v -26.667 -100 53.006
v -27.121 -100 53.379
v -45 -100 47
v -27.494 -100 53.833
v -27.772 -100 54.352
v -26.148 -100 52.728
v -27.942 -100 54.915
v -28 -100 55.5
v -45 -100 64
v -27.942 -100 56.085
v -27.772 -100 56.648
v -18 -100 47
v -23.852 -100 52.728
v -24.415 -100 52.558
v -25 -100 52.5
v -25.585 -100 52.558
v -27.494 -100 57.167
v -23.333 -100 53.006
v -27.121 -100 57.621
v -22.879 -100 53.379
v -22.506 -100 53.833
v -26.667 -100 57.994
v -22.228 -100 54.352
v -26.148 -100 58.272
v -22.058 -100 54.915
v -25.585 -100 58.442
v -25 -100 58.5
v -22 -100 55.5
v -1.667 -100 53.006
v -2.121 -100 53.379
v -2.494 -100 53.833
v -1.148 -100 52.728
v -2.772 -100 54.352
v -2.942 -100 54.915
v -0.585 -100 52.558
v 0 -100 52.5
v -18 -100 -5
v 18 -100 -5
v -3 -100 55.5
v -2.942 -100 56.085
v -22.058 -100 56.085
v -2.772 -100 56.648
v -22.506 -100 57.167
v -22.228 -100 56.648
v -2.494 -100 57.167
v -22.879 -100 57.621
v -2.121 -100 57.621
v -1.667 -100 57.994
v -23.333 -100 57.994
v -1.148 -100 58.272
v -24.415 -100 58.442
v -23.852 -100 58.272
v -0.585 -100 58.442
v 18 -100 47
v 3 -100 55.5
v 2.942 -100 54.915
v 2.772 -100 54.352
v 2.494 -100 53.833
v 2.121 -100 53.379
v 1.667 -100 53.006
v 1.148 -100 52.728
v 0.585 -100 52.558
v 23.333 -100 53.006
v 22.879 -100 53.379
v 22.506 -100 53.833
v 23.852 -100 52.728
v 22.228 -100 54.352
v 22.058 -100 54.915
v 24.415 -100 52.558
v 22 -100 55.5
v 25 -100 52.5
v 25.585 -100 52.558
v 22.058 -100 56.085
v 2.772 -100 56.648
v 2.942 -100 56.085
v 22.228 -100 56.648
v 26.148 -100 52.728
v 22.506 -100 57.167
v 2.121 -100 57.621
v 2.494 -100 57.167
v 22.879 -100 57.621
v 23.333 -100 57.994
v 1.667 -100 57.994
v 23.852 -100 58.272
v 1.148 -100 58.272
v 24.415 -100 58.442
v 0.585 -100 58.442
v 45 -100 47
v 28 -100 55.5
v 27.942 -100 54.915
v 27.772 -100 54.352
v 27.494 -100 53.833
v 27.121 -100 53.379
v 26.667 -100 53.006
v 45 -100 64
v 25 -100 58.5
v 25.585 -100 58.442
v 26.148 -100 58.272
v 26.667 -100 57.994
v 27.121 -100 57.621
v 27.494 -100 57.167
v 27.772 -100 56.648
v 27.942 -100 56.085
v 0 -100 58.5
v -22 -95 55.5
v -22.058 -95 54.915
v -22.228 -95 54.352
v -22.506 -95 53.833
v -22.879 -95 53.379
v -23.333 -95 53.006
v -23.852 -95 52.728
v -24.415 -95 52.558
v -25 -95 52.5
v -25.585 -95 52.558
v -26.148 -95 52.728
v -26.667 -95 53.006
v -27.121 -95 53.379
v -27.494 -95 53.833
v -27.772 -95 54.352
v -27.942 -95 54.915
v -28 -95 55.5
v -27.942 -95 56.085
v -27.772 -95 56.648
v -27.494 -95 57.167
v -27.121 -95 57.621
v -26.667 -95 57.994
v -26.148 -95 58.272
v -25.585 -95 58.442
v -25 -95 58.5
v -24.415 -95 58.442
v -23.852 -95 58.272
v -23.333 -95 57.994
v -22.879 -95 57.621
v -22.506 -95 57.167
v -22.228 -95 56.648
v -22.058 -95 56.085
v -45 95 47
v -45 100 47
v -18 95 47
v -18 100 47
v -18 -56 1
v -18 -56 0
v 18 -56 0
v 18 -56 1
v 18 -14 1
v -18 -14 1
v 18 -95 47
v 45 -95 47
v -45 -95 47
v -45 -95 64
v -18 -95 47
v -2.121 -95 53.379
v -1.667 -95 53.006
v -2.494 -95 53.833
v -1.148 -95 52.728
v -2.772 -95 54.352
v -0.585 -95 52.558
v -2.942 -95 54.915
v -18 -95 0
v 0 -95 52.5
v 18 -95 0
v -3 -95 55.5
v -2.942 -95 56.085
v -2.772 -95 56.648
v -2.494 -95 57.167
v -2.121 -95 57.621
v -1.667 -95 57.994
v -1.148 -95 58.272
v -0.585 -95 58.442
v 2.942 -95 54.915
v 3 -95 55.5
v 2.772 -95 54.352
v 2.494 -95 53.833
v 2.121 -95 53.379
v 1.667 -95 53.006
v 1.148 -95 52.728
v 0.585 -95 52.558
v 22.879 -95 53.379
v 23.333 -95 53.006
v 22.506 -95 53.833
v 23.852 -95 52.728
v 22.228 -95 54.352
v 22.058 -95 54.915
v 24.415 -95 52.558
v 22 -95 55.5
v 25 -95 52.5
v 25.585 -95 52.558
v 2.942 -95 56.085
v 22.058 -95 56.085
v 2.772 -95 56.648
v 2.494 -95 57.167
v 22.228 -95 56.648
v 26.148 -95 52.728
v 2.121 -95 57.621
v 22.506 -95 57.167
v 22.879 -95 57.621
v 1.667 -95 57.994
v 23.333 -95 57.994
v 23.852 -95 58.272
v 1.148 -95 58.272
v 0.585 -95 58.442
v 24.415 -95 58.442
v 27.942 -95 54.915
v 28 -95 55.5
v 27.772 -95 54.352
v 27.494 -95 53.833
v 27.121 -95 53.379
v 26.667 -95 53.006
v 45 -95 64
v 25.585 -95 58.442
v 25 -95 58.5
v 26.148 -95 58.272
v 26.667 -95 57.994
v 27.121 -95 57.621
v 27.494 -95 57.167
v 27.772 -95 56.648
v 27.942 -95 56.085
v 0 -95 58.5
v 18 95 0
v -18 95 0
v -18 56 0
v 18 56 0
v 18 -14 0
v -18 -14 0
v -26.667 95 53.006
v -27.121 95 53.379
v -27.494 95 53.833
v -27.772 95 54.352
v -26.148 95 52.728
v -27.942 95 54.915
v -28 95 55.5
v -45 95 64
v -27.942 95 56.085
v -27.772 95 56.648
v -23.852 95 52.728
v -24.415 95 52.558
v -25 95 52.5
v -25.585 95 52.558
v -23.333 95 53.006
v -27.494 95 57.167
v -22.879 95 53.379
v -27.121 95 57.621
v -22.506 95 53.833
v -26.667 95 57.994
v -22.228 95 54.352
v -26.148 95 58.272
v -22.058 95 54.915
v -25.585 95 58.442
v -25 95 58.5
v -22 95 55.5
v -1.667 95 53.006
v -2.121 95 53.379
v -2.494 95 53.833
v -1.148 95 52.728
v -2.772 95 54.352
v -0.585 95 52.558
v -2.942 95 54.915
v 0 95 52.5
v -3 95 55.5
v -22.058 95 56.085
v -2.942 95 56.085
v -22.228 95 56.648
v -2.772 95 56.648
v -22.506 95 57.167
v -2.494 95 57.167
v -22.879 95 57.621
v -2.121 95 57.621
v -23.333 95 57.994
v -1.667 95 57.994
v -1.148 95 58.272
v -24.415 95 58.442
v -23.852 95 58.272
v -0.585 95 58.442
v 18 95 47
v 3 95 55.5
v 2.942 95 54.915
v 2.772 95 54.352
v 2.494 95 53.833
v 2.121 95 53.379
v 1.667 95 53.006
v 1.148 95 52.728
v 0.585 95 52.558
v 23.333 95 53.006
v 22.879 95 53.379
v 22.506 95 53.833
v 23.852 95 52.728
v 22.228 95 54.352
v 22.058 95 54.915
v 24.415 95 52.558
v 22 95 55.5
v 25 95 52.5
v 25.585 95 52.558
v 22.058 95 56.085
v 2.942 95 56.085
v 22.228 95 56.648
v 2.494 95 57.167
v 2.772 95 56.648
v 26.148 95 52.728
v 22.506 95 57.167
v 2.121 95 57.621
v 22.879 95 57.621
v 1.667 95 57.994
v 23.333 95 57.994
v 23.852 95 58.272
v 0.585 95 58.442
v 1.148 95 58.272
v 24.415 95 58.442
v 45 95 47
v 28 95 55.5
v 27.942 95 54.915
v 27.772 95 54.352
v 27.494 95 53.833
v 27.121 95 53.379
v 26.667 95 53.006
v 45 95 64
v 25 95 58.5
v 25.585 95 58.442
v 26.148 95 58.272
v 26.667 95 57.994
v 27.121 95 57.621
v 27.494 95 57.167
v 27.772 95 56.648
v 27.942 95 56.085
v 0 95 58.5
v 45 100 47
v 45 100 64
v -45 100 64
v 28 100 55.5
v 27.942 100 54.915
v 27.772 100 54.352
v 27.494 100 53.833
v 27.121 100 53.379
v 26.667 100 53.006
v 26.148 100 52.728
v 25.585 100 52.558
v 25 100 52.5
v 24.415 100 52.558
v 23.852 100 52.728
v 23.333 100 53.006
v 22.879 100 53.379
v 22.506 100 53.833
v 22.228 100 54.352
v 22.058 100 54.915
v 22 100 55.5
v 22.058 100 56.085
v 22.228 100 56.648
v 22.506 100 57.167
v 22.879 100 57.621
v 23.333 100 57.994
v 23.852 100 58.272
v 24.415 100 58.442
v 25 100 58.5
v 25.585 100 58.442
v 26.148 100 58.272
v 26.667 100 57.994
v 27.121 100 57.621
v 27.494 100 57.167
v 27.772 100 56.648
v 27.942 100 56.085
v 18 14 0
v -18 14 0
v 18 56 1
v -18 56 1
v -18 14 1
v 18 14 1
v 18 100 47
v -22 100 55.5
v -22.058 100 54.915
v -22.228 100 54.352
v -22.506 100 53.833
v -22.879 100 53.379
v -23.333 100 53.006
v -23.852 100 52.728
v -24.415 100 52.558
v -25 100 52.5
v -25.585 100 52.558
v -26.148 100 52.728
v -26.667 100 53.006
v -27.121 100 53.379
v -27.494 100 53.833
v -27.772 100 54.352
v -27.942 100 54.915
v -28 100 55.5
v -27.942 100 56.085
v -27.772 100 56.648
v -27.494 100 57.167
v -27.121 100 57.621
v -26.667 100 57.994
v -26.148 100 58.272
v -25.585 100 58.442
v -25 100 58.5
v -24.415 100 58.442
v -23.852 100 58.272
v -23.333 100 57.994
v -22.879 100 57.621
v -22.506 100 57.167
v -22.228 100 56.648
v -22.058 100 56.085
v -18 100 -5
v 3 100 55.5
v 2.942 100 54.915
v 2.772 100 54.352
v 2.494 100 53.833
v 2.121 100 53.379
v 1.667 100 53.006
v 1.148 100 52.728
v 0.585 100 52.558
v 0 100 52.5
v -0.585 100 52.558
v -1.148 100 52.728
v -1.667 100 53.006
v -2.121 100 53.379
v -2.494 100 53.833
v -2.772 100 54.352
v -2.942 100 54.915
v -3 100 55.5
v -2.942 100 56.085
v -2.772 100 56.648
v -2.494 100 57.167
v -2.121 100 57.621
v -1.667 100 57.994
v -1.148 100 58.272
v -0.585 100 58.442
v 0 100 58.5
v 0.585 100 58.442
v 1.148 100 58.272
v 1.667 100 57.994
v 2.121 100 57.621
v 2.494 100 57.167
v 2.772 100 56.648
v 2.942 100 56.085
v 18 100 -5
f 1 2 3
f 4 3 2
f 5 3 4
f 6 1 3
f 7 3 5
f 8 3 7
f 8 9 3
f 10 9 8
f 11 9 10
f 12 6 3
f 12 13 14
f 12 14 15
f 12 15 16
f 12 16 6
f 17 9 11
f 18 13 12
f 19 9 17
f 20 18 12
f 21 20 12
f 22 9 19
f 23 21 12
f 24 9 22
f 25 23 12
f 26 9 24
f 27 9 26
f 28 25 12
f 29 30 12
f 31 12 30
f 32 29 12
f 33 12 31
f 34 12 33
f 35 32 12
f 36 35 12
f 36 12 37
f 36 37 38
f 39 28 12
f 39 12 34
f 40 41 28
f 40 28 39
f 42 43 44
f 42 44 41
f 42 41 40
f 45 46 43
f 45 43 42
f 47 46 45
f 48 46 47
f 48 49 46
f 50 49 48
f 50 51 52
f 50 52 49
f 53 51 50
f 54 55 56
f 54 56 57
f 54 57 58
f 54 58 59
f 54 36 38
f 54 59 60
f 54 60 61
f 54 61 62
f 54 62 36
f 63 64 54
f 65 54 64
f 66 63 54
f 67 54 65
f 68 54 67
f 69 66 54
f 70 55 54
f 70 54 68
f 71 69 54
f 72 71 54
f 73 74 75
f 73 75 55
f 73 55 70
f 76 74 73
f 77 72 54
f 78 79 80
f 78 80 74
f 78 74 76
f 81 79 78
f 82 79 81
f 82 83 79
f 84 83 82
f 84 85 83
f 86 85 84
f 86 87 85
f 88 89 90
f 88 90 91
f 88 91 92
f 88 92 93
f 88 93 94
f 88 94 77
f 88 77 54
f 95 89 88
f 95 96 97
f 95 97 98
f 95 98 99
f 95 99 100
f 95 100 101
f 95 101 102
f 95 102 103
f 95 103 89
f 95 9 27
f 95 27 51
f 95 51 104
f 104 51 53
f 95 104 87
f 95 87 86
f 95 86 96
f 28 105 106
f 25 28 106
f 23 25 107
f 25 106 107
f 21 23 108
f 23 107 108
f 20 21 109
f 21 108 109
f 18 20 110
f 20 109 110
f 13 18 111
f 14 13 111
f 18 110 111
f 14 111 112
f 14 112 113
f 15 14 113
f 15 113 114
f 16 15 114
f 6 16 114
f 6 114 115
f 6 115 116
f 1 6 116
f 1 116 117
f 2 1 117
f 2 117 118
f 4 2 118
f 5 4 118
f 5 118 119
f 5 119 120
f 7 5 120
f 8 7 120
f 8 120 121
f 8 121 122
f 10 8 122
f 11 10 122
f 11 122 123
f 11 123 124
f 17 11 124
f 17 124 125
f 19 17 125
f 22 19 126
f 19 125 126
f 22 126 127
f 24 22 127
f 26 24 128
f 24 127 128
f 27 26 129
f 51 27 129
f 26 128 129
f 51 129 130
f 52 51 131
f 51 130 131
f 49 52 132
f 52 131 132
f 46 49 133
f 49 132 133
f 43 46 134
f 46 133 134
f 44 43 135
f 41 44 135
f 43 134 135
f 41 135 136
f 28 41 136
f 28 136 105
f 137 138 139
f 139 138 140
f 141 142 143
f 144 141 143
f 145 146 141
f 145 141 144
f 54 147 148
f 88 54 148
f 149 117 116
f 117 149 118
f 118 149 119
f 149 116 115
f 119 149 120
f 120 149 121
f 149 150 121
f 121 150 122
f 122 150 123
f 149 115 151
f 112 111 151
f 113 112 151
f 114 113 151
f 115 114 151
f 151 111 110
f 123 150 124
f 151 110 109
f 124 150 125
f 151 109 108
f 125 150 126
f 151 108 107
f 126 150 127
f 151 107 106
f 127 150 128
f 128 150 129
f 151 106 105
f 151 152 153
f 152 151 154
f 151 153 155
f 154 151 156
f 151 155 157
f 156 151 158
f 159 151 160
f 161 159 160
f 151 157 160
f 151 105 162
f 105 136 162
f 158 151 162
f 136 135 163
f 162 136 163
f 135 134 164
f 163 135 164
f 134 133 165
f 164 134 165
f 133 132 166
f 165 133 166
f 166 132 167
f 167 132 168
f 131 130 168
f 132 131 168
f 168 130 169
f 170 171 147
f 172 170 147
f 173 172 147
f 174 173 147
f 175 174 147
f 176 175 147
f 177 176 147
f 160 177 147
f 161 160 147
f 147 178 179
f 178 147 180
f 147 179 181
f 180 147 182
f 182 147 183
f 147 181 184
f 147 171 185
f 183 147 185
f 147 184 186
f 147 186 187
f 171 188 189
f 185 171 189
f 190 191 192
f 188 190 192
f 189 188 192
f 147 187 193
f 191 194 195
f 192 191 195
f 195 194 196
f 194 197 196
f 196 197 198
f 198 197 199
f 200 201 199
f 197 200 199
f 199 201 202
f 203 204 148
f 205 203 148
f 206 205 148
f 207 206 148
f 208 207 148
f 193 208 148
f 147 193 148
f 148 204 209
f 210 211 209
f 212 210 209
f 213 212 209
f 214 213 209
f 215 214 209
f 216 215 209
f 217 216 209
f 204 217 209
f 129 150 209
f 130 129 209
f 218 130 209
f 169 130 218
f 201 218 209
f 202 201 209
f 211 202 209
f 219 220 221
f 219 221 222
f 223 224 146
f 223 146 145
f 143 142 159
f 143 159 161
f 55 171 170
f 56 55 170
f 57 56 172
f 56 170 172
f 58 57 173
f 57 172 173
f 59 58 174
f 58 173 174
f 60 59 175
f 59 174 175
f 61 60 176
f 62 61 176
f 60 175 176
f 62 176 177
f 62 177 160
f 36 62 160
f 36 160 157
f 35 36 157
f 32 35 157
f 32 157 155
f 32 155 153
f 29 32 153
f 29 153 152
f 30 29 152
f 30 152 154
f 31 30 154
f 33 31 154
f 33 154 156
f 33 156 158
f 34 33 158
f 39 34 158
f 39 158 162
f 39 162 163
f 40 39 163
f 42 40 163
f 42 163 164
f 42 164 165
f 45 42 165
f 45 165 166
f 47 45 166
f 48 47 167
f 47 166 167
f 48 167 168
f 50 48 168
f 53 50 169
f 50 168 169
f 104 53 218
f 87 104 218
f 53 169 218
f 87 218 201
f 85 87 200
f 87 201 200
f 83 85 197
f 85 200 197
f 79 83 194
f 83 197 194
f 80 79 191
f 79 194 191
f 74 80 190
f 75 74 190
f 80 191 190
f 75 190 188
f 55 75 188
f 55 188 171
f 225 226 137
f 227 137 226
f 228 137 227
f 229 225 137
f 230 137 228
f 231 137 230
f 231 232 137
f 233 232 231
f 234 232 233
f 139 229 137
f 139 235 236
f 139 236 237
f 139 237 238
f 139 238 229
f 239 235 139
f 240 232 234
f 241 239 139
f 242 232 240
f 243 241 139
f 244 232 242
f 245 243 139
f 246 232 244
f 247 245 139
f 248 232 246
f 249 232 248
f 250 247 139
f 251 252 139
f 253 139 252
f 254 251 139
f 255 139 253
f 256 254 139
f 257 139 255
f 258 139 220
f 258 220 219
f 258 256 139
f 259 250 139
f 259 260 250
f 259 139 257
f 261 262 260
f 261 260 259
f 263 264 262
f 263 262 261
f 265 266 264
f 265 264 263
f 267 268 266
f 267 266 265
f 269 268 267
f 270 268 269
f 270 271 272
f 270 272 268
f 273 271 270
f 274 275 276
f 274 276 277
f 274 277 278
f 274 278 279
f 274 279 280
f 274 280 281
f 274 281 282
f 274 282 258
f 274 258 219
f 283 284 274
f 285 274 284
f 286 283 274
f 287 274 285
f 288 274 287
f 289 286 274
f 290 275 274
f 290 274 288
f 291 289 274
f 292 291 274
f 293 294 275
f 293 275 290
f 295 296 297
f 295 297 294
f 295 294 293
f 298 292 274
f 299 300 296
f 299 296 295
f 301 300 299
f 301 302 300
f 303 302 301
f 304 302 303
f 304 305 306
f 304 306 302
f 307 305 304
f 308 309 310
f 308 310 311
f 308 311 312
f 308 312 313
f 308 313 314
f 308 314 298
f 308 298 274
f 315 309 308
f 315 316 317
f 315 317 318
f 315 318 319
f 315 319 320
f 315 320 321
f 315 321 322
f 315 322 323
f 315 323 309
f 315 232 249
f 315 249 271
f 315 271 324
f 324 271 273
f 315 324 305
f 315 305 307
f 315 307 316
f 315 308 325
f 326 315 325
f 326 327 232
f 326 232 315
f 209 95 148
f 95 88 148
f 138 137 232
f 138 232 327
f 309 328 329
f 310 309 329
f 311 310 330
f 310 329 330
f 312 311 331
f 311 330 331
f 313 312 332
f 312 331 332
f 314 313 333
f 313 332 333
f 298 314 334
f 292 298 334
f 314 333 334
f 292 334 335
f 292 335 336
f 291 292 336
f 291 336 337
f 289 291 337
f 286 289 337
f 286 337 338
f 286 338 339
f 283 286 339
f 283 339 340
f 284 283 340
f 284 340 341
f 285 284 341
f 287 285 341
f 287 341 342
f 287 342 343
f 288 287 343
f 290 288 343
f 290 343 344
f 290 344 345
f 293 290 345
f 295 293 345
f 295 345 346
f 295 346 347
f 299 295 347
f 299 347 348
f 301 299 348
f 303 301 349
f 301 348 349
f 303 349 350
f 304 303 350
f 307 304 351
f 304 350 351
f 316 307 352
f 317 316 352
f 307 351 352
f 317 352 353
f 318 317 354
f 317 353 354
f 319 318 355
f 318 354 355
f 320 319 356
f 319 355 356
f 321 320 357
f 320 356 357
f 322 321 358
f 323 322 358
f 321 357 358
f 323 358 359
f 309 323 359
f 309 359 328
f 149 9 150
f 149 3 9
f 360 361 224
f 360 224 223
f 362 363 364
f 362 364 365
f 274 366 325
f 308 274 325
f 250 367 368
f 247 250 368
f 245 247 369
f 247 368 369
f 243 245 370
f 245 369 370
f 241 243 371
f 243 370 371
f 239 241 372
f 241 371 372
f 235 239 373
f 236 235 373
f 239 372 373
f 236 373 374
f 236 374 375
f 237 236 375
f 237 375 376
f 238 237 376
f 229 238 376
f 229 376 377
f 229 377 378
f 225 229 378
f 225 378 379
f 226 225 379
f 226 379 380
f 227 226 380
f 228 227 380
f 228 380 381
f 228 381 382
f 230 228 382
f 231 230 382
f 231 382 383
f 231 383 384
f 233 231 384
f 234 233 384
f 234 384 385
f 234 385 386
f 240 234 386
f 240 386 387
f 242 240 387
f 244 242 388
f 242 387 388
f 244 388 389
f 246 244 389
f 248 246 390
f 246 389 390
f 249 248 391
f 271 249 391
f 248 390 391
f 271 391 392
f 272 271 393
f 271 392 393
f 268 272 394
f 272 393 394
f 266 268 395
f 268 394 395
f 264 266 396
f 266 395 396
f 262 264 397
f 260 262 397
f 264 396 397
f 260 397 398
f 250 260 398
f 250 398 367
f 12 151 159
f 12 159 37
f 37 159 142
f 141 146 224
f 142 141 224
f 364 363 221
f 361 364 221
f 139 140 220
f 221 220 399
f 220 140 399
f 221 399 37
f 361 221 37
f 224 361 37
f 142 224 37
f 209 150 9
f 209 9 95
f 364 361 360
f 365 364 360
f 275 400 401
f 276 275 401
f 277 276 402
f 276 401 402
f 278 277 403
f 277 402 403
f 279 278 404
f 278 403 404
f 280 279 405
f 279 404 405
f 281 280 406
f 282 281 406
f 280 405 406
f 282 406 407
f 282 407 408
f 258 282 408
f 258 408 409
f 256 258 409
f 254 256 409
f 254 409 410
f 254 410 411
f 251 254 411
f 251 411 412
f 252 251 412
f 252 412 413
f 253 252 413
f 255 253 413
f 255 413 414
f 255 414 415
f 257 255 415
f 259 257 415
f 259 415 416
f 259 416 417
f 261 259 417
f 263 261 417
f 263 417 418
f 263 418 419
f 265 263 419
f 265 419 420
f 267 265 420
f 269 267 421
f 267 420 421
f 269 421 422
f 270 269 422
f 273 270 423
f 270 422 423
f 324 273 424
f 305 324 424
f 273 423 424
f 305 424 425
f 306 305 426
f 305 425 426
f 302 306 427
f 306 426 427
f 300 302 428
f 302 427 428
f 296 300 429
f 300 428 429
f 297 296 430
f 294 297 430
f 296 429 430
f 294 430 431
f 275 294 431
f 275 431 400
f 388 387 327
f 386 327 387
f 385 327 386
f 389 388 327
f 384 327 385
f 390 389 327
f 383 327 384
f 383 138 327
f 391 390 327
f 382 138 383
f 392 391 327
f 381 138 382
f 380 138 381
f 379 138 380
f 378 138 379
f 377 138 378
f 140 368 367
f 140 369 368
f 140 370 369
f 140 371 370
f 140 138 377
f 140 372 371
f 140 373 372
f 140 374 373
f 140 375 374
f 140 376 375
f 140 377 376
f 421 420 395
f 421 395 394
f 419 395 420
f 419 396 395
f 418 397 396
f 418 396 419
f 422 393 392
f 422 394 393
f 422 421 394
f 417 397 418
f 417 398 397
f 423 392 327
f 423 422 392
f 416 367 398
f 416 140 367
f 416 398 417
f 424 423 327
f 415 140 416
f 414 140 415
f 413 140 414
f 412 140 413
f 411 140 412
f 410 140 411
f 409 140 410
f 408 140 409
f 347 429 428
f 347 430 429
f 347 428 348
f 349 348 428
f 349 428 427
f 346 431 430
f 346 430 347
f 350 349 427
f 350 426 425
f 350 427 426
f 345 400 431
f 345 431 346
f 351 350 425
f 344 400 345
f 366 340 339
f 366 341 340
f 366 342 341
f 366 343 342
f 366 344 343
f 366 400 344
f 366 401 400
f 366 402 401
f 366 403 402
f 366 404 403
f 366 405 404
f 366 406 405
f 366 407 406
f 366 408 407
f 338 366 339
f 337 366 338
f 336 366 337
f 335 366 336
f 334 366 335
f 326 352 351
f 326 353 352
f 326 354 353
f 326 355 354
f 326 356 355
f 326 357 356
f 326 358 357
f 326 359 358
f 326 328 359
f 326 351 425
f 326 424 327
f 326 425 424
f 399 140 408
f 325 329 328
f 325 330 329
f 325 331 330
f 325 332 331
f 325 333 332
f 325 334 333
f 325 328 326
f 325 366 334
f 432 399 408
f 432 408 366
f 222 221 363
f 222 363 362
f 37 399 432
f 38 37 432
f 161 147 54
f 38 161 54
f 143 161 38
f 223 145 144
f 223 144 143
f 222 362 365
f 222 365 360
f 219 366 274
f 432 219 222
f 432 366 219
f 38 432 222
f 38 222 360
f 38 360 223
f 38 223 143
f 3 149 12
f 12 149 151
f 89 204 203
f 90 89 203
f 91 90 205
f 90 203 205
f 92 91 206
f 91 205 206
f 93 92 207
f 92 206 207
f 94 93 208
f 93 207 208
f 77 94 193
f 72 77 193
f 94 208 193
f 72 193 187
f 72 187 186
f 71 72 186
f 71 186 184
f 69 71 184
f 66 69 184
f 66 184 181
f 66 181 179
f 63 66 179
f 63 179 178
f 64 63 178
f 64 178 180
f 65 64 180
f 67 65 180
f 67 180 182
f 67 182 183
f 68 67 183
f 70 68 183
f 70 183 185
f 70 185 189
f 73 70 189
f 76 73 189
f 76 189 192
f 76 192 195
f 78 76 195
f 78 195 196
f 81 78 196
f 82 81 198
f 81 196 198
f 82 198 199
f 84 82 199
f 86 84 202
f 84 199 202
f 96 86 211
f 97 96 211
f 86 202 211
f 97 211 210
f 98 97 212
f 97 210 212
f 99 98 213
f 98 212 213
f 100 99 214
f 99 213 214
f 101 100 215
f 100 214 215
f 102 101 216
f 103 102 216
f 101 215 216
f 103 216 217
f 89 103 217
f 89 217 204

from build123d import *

# Parameters (mm, degrees)
CROQUIS1_W              = 90
CROQUIS1_H              = 200
SALIENTE_EXTRUIR1_DEPTH = 5
CROQUIS2_W              = 90
CROQUIS2_H              = 5
SALIENTE_EXTRUIR2_DEPTH = 64
CROQUIS3_W              = 36
CROQUIS3_H              = 42
SALIENTE_EXTRUIR3_DEPTH = 1
CROQUIS4_R              = 3
CORTAR_EXTRUIR1_DEPTH   = 201
CROQUIS5_W              = 27
CROQUIS5_H              = 190
CORTAR_EXTRUIR3_DEPTH   = 6
CROQUIS6_W              = 27
CROQUIS6_H              = 52
CORTAR_EXTRUIR4_DEPTH   = 201


with BuildPart() as part:
    # Croquis1 → Saliente-Extruir1 (new body)
    with BuildSketch(Plane.XY):
        Rectangle(CROQUIS1_W, CROQUIS1_H)
    extrude(amount=-SALIENTE_EXTRUIR1_DEPTH)

    # Croquis2 → Saliente-Extruir2 (add)
    with BuildSketch(Plane.XY):
        with Locations((0, 97.5)):
            Rectangle(CROQUIS2_W, CROQUIS2_H)
        with Locations((0, -97.5)):
            Rectangle(CROQUIS2_W, CROQUIS2_H)
    extrude(amount=SALIENTE_EXTRUIR2_DEPTH)

    # Croquis3 → Saliente-Extruir3 (add)
    with BuildSketch(Plane.XY):
        with Locations((0, 35)):
            Rectangle(CROQUIS3_W, CROQUIS3_H)
        with Locations((0, -35)):
            Rectangle(CROQUIS3_W, CROQUIS3_H)
    extrude(amount=SALIENTE_EXTRUIR3_DEPTH)

    # Croquis4 → Cortar-Extruir1 (cut, through all)
    with BuildSketch(Plane(origin=(0, 100, 0), x_dir=(1, 0, 0), z_dir=(0, 1, 0))):
        with Locations((-25, -55.5)):
            Circle(CROQUIS4_R)
        with Locations((0, -55.5)):
            Circle(CROQUIS4_R)
        with Locations((25, -55.5)):
            Circle(CROQUIS4_R)
    extrude(amount=-CORTAR_EXTRUIR1_DEPTH, mode=Mode.SUBTRACT)

    # Croquis5 → Cortar-Extruir3 (cut, through all)
    with BuildSketch(Plane.XY):
        with Locations((-31.5, 0)):
            Rectangle(CROQUIS5_W, CROQUIS5_H)
        with Locations((31.5, 0)):
            Rectangle(CROQUIS5_W, CROQUIS5_H)
    extrude(amount=-CORTAR_EXTRUIR3_DEPTH, mode=Mode.SUBTRACT)

    # Croquis6 → Cortar-Extruir4 (cut, through all)
    with BuildSketch(Plane(origin=(0, 100, 0), x_dir=(1, 0, 0), z_dir=(0, 1, 0))):
        with Locations((-31.5, -21)):
            Rectangle(CROQUIS6_W, CROQUIS6_H)
        with Locations((31.5, -21)):
            Rectangle(CROQUIS6_W, CROQUIS6_H)
    extrude(amount=-CORTAR_EXTRUIR4_DEPTH, mode=Mode.SUBTRACT)


solid = part.part
